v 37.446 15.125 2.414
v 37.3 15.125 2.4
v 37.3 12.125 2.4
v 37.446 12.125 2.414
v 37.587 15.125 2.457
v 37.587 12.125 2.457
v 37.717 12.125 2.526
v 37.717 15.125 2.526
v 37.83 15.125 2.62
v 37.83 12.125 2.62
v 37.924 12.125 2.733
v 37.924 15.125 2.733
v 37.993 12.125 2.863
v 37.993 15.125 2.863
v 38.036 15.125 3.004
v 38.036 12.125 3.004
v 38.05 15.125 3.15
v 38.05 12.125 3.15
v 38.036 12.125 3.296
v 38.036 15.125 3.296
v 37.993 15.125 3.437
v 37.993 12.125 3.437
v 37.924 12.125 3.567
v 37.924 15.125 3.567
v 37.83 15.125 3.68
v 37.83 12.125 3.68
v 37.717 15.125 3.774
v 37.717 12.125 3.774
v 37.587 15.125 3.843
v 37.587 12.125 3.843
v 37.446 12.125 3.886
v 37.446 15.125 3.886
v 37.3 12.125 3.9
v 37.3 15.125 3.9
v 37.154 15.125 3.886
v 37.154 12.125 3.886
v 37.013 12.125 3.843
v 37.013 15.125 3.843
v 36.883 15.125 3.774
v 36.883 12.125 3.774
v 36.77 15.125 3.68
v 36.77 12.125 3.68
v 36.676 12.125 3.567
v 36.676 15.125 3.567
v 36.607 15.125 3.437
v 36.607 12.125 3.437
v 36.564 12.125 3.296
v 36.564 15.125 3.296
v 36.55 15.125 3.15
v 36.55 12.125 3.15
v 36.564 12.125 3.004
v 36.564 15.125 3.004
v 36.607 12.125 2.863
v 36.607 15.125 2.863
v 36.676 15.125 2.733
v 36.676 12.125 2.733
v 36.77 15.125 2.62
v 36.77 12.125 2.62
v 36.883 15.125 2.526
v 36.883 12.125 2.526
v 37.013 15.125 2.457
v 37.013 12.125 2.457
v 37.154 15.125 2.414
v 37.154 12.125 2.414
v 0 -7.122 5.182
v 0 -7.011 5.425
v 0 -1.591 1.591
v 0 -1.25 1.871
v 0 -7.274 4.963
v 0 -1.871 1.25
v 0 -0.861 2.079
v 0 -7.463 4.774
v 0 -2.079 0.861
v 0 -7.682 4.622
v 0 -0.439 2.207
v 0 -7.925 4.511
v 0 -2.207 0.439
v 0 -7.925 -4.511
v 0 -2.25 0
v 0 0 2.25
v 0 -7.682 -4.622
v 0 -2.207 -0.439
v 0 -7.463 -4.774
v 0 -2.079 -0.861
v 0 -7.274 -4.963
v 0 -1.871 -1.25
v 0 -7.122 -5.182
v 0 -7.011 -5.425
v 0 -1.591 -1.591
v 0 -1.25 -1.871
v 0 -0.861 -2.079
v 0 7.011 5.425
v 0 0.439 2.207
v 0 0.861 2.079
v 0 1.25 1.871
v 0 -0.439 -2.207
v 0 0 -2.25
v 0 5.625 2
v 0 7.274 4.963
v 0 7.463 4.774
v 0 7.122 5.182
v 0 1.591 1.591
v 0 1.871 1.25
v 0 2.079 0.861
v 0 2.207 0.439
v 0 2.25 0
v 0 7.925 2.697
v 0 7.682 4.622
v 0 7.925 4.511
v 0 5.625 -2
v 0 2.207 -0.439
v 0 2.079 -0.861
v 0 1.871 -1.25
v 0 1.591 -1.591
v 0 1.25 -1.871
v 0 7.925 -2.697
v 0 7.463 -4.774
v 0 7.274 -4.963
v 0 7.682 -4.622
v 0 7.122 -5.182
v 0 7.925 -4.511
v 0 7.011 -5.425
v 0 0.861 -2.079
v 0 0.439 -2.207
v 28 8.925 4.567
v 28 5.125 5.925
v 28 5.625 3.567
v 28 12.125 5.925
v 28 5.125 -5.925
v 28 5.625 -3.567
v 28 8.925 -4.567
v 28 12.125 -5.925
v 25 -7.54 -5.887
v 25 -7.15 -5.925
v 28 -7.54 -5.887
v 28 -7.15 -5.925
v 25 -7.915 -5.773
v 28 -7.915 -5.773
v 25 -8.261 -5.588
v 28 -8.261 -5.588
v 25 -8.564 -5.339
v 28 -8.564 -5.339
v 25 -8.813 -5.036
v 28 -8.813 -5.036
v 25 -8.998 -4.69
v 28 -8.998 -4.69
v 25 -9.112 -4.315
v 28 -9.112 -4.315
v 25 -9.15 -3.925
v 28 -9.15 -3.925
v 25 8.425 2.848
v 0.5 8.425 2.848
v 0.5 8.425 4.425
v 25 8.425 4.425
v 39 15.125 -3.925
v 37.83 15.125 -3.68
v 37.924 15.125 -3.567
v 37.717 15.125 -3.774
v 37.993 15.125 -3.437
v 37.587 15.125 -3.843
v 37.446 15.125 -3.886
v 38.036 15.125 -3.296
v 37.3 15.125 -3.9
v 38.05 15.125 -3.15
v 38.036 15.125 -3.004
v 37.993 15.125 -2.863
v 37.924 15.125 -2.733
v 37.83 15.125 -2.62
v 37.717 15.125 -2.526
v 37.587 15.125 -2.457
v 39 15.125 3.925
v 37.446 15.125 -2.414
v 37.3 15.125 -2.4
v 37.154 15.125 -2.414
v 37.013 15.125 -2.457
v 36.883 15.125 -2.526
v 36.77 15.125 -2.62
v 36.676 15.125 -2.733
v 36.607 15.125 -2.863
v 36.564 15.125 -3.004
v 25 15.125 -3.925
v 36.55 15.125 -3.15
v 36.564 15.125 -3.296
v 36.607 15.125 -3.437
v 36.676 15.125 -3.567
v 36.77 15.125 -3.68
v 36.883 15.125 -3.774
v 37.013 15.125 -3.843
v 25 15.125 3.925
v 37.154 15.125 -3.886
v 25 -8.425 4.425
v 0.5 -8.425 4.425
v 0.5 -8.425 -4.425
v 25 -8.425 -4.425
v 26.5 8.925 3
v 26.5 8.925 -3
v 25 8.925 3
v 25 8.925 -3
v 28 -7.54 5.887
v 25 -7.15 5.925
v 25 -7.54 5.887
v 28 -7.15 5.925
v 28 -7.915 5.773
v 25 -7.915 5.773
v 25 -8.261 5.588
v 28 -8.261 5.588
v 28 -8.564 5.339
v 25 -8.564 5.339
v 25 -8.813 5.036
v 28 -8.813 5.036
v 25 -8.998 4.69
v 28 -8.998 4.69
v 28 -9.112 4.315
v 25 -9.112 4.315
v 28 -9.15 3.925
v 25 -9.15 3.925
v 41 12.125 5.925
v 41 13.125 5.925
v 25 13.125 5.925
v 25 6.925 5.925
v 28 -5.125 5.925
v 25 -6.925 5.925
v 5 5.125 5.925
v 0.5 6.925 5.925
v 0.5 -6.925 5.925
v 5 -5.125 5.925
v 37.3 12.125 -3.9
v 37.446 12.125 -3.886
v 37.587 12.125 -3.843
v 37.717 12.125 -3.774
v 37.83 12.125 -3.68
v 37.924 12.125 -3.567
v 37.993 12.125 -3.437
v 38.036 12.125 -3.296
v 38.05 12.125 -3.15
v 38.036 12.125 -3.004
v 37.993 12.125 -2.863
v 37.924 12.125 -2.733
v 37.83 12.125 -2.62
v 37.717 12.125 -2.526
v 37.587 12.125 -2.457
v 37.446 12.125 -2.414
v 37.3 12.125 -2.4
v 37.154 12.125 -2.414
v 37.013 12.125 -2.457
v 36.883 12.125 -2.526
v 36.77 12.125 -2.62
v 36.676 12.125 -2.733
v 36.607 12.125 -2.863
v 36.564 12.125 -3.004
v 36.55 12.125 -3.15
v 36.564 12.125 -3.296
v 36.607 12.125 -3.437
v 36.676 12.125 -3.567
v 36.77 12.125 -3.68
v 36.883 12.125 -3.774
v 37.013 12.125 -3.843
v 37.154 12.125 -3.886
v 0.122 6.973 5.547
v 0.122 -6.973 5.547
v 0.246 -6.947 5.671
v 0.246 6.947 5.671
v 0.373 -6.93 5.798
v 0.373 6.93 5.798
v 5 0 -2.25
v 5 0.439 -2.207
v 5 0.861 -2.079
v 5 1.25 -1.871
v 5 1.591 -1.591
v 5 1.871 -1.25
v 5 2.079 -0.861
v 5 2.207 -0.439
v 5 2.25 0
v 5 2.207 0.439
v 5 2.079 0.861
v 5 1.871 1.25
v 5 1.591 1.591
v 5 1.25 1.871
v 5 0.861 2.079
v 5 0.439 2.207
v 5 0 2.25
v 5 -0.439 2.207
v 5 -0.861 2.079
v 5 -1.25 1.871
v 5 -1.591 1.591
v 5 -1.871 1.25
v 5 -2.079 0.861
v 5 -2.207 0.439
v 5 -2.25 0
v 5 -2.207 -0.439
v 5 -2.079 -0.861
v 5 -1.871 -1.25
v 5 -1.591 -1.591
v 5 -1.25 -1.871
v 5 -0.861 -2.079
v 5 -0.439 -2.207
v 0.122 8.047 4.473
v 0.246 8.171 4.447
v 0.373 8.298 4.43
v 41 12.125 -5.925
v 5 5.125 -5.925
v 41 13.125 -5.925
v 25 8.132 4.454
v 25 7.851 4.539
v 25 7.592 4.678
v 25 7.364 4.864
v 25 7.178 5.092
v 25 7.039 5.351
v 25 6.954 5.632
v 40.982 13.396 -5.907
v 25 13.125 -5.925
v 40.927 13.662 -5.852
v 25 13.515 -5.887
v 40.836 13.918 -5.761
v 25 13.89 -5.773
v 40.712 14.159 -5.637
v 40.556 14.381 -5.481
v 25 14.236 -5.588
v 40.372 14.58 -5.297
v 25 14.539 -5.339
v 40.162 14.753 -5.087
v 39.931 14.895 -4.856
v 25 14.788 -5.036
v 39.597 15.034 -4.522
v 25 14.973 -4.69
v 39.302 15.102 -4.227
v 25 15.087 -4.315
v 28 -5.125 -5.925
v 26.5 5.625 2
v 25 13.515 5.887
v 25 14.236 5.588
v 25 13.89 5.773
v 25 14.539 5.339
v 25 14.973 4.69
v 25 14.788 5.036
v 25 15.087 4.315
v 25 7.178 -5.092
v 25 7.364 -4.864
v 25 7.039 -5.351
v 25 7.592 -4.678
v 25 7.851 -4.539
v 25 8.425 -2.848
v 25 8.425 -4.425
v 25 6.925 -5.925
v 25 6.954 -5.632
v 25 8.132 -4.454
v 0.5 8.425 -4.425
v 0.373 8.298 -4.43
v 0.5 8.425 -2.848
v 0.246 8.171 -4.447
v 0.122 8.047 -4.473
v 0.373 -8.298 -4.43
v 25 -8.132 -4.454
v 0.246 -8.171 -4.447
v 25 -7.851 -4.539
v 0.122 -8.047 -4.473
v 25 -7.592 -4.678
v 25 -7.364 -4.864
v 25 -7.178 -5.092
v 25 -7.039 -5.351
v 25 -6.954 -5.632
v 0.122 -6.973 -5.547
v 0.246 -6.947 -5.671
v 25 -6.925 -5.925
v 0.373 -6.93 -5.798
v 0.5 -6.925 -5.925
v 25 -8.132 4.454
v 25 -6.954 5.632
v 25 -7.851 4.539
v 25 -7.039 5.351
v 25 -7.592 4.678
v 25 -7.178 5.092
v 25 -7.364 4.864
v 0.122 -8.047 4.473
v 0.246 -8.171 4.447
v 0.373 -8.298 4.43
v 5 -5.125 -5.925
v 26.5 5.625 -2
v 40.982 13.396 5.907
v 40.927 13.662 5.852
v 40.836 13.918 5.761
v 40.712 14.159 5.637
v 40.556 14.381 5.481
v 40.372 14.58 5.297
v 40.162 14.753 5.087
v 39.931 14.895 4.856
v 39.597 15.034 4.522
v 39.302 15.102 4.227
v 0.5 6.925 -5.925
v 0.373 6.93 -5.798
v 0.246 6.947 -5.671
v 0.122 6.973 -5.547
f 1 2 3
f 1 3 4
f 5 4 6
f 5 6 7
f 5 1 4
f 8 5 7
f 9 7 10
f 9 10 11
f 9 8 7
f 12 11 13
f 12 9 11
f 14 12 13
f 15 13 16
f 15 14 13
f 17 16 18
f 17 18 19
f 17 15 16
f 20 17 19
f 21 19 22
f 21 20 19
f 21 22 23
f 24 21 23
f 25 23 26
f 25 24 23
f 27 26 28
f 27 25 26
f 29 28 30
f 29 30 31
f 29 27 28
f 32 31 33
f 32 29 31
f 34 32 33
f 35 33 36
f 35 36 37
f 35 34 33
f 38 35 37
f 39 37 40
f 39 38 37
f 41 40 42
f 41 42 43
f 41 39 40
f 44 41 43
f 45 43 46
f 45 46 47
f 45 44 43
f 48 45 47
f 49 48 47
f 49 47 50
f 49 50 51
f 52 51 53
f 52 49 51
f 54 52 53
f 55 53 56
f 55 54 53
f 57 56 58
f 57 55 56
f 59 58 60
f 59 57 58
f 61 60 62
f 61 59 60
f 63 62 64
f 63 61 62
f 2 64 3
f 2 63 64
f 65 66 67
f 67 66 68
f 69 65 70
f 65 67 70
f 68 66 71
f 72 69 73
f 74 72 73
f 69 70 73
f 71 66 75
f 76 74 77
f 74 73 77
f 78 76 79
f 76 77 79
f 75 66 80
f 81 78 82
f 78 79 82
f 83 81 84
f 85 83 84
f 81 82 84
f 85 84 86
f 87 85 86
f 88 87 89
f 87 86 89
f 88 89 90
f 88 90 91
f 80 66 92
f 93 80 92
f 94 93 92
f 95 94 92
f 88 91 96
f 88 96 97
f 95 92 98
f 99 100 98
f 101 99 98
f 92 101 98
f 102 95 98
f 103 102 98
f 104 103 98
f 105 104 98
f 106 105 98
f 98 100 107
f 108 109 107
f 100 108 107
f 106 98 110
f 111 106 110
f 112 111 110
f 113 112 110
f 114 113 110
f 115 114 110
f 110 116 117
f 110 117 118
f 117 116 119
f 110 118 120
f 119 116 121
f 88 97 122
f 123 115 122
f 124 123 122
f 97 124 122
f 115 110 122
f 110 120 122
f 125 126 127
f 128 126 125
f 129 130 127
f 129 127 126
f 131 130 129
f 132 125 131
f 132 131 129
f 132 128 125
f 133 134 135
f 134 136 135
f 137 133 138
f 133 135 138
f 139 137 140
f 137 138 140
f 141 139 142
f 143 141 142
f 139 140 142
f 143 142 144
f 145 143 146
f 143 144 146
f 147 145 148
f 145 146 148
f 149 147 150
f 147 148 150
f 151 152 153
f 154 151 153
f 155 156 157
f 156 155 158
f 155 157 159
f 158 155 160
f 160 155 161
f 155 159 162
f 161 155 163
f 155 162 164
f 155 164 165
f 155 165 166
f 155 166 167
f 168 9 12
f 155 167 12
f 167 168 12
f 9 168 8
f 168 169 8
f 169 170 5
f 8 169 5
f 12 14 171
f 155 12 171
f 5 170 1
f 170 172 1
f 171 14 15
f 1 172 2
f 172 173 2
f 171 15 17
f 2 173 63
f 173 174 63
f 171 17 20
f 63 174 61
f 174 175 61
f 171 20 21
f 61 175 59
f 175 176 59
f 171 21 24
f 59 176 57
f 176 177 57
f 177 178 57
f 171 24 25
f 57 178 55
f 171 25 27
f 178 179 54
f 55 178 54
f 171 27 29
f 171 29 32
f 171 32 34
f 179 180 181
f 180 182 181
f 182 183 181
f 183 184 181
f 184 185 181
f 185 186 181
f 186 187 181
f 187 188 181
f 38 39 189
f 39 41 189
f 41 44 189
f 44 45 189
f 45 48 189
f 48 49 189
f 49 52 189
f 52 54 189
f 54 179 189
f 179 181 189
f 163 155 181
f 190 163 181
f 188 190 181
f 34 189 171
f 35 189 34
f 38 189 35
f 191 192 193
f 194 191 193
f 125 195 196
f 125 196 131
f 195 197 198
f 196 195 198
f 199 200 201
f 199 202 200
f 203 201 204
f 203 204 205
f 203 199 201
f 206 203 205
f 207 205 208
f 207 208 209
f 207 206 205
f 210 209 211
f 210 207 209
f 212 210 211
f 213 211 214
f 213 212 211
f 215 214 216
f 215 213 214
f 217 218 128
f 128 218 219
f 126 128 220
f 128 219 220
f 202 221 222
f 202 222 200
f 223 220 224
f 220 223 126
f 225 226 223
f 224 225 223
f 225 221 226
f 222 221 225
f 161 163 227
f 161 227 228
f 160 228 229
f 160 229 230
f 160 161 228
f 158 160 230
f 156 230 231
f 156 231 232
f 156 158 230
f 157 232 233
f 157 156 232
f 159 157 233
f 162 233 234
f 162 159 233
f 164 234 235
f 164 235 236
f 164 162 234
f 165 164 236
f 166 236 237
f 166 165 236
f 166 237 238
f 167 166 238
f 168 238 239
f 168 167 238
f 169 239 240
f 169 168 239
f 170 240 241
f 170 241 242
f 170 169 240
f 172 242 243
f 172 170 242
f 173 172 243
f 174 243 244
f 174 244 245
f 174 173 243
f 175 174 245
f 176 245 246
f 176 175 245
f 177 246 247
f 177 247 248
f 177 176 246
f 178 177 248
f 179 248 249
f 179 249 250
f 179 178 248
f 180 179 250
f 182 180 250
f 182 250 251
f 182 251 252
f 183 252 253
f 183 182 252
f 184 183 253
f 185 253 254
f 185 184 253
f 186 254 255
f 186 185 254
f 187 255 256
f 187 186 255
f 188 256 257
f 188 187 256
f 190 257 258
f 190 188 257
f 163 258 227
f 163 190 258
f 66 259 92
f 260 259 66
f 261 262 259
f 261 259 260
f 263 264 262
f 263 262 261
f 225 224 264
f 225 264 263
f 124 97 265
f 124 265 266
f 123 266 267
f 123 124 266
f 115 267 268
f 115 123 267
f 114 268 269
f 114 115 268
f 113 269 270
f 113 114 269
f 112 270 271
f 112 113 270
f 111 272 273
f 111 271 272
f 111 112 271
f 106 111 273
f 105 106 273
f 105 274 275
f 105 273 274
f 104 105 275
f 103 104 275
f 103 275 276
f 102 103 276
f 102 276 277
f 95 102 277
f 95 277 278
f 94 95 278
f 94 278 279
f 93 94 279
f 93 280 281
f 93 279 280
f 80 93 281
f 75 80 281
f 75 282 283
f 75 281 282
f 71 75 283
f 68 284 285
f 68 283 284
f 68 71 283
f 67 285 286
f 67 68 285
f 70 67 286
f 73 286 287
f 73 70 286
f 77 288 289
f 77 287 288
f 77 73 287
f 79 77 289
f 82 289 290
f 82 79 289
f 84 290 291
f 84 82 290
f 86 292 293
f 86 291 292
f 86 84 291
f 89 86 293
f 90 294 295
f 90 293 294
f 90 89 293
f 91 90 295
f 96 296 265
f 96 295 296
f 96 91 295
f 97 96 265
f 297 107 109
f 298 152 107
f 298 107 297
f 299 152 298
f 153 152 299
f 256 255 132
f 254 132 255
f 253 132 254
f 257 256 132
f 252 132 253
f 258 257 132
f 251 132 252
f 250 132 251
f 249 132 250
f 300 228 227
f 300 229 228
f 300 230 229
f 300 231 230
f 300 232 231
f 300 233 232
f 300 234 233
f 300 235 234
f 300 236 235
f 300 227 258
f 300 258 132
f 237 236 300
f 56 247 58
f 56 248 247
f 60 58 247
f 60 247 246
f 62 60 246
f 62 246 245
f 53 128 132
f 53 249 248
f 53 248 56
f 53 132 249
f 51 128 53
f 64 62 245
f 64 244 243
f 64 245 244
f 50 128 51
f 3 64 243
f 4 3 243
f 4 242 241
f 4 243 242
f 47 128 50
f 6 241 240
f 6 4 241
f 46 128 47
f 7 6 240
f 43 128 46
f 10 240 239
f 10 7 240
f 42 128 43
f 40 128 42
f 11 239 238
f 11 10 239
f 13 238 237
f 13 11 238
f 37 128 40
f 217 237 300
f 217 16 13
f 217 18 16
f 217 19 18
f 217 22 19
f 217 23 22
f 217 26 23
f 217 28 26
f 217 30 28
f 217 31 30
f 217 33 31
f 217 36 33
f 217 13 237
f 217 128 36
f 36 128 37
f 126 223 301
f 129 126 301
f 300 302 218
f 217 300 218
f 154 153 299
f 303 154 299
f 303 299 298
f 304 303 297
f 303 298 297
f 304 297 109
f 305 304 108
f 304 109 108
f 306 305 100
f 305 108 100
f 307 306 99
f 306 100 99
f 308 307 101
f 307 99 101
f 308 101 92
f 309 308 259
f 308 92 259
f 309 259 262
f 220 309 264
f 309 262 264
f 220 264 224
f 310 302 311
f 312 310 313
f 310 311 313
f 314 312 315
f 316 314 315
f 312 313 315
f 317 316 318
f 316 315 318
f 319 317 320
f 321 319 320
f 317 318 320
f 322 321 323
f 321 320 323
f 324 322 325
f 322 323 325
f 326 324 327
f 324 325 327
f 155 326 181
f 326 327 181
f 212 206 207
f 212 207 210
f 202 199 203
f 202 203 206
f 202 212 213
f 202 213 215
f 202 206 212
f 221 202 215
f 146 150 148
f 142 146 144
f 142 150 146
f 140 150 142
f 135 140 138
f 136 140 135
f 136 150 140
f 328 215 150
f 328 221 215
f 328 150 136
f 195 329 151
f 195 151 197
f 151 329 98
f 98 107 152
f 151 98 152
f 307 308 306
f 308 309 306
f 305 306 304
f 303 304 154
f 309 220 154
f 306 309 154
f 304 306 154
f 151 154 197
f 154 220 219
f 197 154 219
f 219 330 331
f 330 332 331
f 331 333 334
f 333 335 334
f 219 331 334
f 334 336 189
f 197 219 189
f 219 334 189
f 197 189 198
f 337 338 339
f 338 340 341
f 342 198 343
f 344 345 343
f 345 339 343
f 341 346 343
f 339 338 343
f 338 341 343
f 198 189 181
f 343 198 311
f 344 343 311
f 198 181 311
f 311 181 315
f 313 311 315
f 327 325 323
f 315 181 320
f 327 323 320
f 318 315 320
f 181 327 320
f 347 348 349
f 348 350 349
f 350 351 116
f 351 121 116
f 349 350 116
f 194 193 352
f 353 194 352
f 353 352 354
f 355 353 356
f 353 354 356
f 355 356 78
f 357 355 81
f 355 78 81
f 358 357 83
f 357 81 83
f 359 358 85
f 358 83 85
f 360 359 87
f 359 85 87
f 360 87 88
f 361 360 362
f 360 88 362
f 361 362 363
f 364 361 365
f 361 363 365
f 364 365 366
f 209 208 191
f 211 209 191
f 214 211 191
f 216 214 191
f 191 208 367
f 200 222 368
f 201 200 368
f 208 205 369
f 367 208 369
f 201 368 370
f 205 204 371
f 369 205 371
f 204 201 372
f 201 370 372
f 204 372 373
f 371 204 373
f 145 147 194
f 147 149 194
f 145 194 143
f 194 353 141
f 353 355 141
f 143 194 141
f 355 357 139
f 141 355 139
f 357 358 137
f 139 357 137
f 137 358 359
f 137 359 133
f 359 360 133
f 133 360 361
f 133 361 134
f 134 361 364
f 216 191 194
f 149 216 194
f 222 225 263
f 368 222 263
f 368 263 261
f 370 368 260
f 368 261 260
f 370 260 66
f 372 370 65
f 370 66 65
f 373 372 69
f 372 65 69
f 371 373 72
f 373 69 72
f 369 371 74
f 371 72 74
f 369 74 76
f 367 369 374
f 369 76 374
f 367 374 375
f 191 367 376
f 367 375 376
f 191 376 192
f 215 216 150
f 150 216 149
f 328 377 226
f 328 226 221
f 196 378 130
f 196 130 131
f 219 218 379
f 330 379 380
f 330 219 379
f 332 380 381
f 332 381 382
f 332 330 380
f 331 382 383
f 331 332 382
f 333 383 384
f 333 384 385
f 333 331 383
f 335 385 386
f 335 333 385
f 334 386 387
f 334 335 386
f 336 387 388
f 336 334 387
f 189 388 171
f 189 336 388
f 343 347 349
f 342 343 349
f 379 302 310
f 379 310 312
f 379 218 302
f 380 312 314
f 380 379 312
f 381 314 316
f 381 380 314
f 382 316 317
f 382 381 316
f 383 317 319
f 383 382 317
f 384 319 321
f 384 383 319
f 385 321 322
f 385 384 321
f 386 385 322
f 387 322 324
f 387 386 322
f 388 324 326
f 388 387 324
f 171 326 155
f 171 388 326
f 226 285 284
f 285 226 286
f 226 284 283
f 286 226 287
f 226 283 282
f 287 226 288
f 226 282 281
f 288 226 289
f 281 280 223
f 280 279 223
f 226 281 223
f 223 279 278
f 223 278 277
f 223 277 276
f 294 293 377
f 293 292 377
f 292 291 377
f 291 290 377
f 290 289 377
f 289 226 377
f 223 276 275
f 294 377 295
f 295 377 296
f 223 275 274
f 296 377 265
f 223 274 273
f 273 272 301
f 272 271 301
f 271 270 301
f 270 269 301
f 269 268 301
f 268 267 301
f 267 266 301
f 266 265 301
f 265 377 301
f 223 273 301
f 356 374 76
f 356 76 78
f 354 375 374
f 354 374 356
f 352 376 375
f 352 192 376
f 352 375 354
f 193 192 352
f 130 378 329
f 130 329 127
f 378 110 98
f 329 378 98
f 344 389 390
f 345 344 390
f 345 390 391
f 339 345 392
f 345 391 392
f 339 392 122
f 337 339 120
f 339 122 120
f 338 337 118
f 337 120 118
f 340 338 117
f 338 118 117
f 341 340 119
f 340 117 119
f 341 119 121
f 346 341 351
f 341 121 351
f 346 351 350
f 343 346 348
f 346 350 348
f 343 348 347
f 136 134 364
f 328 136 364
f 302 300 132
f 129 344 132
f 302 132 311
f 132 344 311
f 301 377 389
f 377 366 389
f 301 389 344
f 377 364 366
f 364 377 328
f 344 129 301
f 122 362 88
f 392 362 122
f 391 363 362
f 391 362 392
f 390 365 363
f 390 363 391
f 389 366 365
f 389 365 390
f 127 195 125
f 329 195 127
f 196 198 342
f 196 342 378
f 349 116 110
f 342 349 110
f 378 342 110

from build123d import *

# Parameters (mm, degrees)
BOSS_EXTRUDE1_DEPTH     = 25
CUT_EXTRUDE1_DEPTH      = 28.038606658
CUT_EXTRUDE1_DEPTH_BACK = 28.038606658
SKETCH2_W               = 20
SKETCH2_H               = 10.25
CUT_EXTRUDE2_DEPTH      = 23.496360817
CUT_EXTRUDE2_DEPTH_BACK = 23.496360817
SKETCH3_R               = 2.25
SKETCH5_W               = 11.85
SKETCH5_H               = 4.025
BOSS_EXTRUDE2_DEPTH     = 3
CUT_EXTRUDE3_DEPTH      = 33.370839501
CUT_EXTRUDE3_DEPTH_BACK = 33.370839501
SKETCH6_W               = 16
SKETCH6_H               = 11.85
SKETCH6_R               = 0.75
BOSS_EXTRUDE3_DEPTH     = 3
FILLET1_R               = 2
CHAMFER1_SIZE           = 1.5
CHAMFER2_SIZE           = 0.5


with BuildPart() as part:
    # Sketch1 → Boss-Extrude1 (new body)
    with BuildSketch(Plane(origin=(0, 0, 0), x_dir=(0, 0, -1), z_dir=(1, 0, 0))):
        with BuildLine():
            Line((-4.425, -8.425), (4.425, -8.425))
            ThreePointArc((4.425, -8.425), (4.864339828, -7.364339828), (5.925, -6.925))
            Line((5.925, -6.925), (5.925, 6.925))
            ThreePointArc((5.925, 6.925), (4.864339828, 7.364339828), (4.425, 8.425))
            Line((4.425, 8.425), (-4.425, 8.425))
            ThreePointArc((-4.425, 8.425), (-4.864339828, 7.364339828), (-5.925, 6.925))
            Line((-5.925, 6.925), (-5.925, -6.925))
            ThreePointArc((-5.925, -6.925), (-4.864339828, -7.364339828), (-4.425, -8.425))
        make_face()
    extrude(amount=BOSS_EXTRUDE1_DEPTH)

    # Sketch2 → Cut-Extrude1 (cut, two sides: drawn at the far end of the back side and taken through both)
    with BuildSketch(Plane.XY.offset(-CUT_EXTRUDE1_DEPTH_BACK)):
        with Locations((15, 0)):
            Rectangle(SKETCH2_W, SKETCH2_H)
    extrude(amount=CUT_EXTRUDE1_DEPTH + CUT_EXTRUDE1_DEPTH_BACK, mode=Mode.SUBTRACT)

    # Sketch3 → Cut-Extrude2 (cut, two sides: drawn at the far end of the back side and taken through both)
    with BuildSketch(Plane(origin=(5, 0, 0), x_dir=(0, 0, -1), z_dir=(1, 0, 0)).offset(-CUT_EXTRUDE2_DEPTH_BACK)):
        Circle(SKETCH3_R)
    extrude(amount=CUT_EXTRUDE2_DEPTH + CUT_EXTRUDE2_DEPTH_BACK, mode=Mode.SUBTRACT)

    # Sketch5 → Boss-Extrude2 (add)
    with BuildSketch(Plane(origin=(25, 0, 0), x_dir=(0, 0, -1), z_dir=(1, 0, 0))):
        Polygon((-5.925, 5.125), (5.925, 5.125), (5.925, 9.15), (5.925, 15.125), (-5.925, 15.125), (-5.925, 9.15), align=None)
        with Locations((0, -7.1375)):
            Rectangle(SKETCH5_W, SKETCH5_H)
    extrude(amount=BOSS_EXTRUDE2_DEPTH)

    # Sketch4 → Cut-Extrude3 (cut, two sides: drawn at the far end of the back side and taken through both)
    with BuildSketch(Plane(origin=(28, 0, 0), x_dir=(0, 0, -1), z_dir=(1, 0, 0)).offset(-CUT_EXTRUDE3_DEPTH_BACK)):
        Polygon((-3, 8.925), (3, 8.925), (2, 5.625), (-2, 5.625), align=None)
    extrude(amount=CUT_EXTRUDE3_DEPTH + CUT_EXTRUDE3_DEPTH_BACK, mode=Mode.SUBTRACT)

    # Sketch6 → Boss-Extrude3 (add)
    with BuildSketch(Plane.XZ.offset(-15.125)):
        with Locations((33, 0)):
            Rectangle(SKETCH6_W, SKETCH6_H)
        with Locations(Location((37.3, -3.15, 0), (0, 0, 270))):
            Circle(SKETCH6_R, mode=Mode.SUBTRACT)
        with Locations(Location((37.3, 3.15, 0), (0, 0, 270))):
            Circle(SKETCH6_R, mode=Mode.SUBTRACT)
    extrude(amount=BOSS_EXTRUDE3_DEPTH)

    # Fillet1
    fillet1_edges = [part.edges().sort_by_distance(p)[0] for p in [
        (41, 15.125, 0),
        (33, 15.125, -5.925),
        (33, 15.125, 5.925),
        (26.5, -9.15, 5.925),
        (26.5, -9.15, -5.925),
    ]]
    fillet(fillet1_edges, radius=FILLET1_R)

    # Chamfer1
    chamfer1_edges = [part.edges().sort_by_distance(p)[0] for p in [
        (28, 7.275, -2.5),
        (28, 7.275, 2.5),
    ]]
    chamfer(chamfer1_edges, length=CHAMFER1_SIZE)

    # Chamfer2
    chamfer2_edges = [part.edges().sort_by_distance(p)[0] for p in [
        (0, -8.425, 0),
        (0, 0, 5.925),
        (0, 8.425, 3.636742424),
        (0, 8.425, -3.636742424),
        (0, 0, -5.925),
    ]]
    chamfer(chamfer2_edges, length=CHAMFER2_SIZE)


solid = part.part
